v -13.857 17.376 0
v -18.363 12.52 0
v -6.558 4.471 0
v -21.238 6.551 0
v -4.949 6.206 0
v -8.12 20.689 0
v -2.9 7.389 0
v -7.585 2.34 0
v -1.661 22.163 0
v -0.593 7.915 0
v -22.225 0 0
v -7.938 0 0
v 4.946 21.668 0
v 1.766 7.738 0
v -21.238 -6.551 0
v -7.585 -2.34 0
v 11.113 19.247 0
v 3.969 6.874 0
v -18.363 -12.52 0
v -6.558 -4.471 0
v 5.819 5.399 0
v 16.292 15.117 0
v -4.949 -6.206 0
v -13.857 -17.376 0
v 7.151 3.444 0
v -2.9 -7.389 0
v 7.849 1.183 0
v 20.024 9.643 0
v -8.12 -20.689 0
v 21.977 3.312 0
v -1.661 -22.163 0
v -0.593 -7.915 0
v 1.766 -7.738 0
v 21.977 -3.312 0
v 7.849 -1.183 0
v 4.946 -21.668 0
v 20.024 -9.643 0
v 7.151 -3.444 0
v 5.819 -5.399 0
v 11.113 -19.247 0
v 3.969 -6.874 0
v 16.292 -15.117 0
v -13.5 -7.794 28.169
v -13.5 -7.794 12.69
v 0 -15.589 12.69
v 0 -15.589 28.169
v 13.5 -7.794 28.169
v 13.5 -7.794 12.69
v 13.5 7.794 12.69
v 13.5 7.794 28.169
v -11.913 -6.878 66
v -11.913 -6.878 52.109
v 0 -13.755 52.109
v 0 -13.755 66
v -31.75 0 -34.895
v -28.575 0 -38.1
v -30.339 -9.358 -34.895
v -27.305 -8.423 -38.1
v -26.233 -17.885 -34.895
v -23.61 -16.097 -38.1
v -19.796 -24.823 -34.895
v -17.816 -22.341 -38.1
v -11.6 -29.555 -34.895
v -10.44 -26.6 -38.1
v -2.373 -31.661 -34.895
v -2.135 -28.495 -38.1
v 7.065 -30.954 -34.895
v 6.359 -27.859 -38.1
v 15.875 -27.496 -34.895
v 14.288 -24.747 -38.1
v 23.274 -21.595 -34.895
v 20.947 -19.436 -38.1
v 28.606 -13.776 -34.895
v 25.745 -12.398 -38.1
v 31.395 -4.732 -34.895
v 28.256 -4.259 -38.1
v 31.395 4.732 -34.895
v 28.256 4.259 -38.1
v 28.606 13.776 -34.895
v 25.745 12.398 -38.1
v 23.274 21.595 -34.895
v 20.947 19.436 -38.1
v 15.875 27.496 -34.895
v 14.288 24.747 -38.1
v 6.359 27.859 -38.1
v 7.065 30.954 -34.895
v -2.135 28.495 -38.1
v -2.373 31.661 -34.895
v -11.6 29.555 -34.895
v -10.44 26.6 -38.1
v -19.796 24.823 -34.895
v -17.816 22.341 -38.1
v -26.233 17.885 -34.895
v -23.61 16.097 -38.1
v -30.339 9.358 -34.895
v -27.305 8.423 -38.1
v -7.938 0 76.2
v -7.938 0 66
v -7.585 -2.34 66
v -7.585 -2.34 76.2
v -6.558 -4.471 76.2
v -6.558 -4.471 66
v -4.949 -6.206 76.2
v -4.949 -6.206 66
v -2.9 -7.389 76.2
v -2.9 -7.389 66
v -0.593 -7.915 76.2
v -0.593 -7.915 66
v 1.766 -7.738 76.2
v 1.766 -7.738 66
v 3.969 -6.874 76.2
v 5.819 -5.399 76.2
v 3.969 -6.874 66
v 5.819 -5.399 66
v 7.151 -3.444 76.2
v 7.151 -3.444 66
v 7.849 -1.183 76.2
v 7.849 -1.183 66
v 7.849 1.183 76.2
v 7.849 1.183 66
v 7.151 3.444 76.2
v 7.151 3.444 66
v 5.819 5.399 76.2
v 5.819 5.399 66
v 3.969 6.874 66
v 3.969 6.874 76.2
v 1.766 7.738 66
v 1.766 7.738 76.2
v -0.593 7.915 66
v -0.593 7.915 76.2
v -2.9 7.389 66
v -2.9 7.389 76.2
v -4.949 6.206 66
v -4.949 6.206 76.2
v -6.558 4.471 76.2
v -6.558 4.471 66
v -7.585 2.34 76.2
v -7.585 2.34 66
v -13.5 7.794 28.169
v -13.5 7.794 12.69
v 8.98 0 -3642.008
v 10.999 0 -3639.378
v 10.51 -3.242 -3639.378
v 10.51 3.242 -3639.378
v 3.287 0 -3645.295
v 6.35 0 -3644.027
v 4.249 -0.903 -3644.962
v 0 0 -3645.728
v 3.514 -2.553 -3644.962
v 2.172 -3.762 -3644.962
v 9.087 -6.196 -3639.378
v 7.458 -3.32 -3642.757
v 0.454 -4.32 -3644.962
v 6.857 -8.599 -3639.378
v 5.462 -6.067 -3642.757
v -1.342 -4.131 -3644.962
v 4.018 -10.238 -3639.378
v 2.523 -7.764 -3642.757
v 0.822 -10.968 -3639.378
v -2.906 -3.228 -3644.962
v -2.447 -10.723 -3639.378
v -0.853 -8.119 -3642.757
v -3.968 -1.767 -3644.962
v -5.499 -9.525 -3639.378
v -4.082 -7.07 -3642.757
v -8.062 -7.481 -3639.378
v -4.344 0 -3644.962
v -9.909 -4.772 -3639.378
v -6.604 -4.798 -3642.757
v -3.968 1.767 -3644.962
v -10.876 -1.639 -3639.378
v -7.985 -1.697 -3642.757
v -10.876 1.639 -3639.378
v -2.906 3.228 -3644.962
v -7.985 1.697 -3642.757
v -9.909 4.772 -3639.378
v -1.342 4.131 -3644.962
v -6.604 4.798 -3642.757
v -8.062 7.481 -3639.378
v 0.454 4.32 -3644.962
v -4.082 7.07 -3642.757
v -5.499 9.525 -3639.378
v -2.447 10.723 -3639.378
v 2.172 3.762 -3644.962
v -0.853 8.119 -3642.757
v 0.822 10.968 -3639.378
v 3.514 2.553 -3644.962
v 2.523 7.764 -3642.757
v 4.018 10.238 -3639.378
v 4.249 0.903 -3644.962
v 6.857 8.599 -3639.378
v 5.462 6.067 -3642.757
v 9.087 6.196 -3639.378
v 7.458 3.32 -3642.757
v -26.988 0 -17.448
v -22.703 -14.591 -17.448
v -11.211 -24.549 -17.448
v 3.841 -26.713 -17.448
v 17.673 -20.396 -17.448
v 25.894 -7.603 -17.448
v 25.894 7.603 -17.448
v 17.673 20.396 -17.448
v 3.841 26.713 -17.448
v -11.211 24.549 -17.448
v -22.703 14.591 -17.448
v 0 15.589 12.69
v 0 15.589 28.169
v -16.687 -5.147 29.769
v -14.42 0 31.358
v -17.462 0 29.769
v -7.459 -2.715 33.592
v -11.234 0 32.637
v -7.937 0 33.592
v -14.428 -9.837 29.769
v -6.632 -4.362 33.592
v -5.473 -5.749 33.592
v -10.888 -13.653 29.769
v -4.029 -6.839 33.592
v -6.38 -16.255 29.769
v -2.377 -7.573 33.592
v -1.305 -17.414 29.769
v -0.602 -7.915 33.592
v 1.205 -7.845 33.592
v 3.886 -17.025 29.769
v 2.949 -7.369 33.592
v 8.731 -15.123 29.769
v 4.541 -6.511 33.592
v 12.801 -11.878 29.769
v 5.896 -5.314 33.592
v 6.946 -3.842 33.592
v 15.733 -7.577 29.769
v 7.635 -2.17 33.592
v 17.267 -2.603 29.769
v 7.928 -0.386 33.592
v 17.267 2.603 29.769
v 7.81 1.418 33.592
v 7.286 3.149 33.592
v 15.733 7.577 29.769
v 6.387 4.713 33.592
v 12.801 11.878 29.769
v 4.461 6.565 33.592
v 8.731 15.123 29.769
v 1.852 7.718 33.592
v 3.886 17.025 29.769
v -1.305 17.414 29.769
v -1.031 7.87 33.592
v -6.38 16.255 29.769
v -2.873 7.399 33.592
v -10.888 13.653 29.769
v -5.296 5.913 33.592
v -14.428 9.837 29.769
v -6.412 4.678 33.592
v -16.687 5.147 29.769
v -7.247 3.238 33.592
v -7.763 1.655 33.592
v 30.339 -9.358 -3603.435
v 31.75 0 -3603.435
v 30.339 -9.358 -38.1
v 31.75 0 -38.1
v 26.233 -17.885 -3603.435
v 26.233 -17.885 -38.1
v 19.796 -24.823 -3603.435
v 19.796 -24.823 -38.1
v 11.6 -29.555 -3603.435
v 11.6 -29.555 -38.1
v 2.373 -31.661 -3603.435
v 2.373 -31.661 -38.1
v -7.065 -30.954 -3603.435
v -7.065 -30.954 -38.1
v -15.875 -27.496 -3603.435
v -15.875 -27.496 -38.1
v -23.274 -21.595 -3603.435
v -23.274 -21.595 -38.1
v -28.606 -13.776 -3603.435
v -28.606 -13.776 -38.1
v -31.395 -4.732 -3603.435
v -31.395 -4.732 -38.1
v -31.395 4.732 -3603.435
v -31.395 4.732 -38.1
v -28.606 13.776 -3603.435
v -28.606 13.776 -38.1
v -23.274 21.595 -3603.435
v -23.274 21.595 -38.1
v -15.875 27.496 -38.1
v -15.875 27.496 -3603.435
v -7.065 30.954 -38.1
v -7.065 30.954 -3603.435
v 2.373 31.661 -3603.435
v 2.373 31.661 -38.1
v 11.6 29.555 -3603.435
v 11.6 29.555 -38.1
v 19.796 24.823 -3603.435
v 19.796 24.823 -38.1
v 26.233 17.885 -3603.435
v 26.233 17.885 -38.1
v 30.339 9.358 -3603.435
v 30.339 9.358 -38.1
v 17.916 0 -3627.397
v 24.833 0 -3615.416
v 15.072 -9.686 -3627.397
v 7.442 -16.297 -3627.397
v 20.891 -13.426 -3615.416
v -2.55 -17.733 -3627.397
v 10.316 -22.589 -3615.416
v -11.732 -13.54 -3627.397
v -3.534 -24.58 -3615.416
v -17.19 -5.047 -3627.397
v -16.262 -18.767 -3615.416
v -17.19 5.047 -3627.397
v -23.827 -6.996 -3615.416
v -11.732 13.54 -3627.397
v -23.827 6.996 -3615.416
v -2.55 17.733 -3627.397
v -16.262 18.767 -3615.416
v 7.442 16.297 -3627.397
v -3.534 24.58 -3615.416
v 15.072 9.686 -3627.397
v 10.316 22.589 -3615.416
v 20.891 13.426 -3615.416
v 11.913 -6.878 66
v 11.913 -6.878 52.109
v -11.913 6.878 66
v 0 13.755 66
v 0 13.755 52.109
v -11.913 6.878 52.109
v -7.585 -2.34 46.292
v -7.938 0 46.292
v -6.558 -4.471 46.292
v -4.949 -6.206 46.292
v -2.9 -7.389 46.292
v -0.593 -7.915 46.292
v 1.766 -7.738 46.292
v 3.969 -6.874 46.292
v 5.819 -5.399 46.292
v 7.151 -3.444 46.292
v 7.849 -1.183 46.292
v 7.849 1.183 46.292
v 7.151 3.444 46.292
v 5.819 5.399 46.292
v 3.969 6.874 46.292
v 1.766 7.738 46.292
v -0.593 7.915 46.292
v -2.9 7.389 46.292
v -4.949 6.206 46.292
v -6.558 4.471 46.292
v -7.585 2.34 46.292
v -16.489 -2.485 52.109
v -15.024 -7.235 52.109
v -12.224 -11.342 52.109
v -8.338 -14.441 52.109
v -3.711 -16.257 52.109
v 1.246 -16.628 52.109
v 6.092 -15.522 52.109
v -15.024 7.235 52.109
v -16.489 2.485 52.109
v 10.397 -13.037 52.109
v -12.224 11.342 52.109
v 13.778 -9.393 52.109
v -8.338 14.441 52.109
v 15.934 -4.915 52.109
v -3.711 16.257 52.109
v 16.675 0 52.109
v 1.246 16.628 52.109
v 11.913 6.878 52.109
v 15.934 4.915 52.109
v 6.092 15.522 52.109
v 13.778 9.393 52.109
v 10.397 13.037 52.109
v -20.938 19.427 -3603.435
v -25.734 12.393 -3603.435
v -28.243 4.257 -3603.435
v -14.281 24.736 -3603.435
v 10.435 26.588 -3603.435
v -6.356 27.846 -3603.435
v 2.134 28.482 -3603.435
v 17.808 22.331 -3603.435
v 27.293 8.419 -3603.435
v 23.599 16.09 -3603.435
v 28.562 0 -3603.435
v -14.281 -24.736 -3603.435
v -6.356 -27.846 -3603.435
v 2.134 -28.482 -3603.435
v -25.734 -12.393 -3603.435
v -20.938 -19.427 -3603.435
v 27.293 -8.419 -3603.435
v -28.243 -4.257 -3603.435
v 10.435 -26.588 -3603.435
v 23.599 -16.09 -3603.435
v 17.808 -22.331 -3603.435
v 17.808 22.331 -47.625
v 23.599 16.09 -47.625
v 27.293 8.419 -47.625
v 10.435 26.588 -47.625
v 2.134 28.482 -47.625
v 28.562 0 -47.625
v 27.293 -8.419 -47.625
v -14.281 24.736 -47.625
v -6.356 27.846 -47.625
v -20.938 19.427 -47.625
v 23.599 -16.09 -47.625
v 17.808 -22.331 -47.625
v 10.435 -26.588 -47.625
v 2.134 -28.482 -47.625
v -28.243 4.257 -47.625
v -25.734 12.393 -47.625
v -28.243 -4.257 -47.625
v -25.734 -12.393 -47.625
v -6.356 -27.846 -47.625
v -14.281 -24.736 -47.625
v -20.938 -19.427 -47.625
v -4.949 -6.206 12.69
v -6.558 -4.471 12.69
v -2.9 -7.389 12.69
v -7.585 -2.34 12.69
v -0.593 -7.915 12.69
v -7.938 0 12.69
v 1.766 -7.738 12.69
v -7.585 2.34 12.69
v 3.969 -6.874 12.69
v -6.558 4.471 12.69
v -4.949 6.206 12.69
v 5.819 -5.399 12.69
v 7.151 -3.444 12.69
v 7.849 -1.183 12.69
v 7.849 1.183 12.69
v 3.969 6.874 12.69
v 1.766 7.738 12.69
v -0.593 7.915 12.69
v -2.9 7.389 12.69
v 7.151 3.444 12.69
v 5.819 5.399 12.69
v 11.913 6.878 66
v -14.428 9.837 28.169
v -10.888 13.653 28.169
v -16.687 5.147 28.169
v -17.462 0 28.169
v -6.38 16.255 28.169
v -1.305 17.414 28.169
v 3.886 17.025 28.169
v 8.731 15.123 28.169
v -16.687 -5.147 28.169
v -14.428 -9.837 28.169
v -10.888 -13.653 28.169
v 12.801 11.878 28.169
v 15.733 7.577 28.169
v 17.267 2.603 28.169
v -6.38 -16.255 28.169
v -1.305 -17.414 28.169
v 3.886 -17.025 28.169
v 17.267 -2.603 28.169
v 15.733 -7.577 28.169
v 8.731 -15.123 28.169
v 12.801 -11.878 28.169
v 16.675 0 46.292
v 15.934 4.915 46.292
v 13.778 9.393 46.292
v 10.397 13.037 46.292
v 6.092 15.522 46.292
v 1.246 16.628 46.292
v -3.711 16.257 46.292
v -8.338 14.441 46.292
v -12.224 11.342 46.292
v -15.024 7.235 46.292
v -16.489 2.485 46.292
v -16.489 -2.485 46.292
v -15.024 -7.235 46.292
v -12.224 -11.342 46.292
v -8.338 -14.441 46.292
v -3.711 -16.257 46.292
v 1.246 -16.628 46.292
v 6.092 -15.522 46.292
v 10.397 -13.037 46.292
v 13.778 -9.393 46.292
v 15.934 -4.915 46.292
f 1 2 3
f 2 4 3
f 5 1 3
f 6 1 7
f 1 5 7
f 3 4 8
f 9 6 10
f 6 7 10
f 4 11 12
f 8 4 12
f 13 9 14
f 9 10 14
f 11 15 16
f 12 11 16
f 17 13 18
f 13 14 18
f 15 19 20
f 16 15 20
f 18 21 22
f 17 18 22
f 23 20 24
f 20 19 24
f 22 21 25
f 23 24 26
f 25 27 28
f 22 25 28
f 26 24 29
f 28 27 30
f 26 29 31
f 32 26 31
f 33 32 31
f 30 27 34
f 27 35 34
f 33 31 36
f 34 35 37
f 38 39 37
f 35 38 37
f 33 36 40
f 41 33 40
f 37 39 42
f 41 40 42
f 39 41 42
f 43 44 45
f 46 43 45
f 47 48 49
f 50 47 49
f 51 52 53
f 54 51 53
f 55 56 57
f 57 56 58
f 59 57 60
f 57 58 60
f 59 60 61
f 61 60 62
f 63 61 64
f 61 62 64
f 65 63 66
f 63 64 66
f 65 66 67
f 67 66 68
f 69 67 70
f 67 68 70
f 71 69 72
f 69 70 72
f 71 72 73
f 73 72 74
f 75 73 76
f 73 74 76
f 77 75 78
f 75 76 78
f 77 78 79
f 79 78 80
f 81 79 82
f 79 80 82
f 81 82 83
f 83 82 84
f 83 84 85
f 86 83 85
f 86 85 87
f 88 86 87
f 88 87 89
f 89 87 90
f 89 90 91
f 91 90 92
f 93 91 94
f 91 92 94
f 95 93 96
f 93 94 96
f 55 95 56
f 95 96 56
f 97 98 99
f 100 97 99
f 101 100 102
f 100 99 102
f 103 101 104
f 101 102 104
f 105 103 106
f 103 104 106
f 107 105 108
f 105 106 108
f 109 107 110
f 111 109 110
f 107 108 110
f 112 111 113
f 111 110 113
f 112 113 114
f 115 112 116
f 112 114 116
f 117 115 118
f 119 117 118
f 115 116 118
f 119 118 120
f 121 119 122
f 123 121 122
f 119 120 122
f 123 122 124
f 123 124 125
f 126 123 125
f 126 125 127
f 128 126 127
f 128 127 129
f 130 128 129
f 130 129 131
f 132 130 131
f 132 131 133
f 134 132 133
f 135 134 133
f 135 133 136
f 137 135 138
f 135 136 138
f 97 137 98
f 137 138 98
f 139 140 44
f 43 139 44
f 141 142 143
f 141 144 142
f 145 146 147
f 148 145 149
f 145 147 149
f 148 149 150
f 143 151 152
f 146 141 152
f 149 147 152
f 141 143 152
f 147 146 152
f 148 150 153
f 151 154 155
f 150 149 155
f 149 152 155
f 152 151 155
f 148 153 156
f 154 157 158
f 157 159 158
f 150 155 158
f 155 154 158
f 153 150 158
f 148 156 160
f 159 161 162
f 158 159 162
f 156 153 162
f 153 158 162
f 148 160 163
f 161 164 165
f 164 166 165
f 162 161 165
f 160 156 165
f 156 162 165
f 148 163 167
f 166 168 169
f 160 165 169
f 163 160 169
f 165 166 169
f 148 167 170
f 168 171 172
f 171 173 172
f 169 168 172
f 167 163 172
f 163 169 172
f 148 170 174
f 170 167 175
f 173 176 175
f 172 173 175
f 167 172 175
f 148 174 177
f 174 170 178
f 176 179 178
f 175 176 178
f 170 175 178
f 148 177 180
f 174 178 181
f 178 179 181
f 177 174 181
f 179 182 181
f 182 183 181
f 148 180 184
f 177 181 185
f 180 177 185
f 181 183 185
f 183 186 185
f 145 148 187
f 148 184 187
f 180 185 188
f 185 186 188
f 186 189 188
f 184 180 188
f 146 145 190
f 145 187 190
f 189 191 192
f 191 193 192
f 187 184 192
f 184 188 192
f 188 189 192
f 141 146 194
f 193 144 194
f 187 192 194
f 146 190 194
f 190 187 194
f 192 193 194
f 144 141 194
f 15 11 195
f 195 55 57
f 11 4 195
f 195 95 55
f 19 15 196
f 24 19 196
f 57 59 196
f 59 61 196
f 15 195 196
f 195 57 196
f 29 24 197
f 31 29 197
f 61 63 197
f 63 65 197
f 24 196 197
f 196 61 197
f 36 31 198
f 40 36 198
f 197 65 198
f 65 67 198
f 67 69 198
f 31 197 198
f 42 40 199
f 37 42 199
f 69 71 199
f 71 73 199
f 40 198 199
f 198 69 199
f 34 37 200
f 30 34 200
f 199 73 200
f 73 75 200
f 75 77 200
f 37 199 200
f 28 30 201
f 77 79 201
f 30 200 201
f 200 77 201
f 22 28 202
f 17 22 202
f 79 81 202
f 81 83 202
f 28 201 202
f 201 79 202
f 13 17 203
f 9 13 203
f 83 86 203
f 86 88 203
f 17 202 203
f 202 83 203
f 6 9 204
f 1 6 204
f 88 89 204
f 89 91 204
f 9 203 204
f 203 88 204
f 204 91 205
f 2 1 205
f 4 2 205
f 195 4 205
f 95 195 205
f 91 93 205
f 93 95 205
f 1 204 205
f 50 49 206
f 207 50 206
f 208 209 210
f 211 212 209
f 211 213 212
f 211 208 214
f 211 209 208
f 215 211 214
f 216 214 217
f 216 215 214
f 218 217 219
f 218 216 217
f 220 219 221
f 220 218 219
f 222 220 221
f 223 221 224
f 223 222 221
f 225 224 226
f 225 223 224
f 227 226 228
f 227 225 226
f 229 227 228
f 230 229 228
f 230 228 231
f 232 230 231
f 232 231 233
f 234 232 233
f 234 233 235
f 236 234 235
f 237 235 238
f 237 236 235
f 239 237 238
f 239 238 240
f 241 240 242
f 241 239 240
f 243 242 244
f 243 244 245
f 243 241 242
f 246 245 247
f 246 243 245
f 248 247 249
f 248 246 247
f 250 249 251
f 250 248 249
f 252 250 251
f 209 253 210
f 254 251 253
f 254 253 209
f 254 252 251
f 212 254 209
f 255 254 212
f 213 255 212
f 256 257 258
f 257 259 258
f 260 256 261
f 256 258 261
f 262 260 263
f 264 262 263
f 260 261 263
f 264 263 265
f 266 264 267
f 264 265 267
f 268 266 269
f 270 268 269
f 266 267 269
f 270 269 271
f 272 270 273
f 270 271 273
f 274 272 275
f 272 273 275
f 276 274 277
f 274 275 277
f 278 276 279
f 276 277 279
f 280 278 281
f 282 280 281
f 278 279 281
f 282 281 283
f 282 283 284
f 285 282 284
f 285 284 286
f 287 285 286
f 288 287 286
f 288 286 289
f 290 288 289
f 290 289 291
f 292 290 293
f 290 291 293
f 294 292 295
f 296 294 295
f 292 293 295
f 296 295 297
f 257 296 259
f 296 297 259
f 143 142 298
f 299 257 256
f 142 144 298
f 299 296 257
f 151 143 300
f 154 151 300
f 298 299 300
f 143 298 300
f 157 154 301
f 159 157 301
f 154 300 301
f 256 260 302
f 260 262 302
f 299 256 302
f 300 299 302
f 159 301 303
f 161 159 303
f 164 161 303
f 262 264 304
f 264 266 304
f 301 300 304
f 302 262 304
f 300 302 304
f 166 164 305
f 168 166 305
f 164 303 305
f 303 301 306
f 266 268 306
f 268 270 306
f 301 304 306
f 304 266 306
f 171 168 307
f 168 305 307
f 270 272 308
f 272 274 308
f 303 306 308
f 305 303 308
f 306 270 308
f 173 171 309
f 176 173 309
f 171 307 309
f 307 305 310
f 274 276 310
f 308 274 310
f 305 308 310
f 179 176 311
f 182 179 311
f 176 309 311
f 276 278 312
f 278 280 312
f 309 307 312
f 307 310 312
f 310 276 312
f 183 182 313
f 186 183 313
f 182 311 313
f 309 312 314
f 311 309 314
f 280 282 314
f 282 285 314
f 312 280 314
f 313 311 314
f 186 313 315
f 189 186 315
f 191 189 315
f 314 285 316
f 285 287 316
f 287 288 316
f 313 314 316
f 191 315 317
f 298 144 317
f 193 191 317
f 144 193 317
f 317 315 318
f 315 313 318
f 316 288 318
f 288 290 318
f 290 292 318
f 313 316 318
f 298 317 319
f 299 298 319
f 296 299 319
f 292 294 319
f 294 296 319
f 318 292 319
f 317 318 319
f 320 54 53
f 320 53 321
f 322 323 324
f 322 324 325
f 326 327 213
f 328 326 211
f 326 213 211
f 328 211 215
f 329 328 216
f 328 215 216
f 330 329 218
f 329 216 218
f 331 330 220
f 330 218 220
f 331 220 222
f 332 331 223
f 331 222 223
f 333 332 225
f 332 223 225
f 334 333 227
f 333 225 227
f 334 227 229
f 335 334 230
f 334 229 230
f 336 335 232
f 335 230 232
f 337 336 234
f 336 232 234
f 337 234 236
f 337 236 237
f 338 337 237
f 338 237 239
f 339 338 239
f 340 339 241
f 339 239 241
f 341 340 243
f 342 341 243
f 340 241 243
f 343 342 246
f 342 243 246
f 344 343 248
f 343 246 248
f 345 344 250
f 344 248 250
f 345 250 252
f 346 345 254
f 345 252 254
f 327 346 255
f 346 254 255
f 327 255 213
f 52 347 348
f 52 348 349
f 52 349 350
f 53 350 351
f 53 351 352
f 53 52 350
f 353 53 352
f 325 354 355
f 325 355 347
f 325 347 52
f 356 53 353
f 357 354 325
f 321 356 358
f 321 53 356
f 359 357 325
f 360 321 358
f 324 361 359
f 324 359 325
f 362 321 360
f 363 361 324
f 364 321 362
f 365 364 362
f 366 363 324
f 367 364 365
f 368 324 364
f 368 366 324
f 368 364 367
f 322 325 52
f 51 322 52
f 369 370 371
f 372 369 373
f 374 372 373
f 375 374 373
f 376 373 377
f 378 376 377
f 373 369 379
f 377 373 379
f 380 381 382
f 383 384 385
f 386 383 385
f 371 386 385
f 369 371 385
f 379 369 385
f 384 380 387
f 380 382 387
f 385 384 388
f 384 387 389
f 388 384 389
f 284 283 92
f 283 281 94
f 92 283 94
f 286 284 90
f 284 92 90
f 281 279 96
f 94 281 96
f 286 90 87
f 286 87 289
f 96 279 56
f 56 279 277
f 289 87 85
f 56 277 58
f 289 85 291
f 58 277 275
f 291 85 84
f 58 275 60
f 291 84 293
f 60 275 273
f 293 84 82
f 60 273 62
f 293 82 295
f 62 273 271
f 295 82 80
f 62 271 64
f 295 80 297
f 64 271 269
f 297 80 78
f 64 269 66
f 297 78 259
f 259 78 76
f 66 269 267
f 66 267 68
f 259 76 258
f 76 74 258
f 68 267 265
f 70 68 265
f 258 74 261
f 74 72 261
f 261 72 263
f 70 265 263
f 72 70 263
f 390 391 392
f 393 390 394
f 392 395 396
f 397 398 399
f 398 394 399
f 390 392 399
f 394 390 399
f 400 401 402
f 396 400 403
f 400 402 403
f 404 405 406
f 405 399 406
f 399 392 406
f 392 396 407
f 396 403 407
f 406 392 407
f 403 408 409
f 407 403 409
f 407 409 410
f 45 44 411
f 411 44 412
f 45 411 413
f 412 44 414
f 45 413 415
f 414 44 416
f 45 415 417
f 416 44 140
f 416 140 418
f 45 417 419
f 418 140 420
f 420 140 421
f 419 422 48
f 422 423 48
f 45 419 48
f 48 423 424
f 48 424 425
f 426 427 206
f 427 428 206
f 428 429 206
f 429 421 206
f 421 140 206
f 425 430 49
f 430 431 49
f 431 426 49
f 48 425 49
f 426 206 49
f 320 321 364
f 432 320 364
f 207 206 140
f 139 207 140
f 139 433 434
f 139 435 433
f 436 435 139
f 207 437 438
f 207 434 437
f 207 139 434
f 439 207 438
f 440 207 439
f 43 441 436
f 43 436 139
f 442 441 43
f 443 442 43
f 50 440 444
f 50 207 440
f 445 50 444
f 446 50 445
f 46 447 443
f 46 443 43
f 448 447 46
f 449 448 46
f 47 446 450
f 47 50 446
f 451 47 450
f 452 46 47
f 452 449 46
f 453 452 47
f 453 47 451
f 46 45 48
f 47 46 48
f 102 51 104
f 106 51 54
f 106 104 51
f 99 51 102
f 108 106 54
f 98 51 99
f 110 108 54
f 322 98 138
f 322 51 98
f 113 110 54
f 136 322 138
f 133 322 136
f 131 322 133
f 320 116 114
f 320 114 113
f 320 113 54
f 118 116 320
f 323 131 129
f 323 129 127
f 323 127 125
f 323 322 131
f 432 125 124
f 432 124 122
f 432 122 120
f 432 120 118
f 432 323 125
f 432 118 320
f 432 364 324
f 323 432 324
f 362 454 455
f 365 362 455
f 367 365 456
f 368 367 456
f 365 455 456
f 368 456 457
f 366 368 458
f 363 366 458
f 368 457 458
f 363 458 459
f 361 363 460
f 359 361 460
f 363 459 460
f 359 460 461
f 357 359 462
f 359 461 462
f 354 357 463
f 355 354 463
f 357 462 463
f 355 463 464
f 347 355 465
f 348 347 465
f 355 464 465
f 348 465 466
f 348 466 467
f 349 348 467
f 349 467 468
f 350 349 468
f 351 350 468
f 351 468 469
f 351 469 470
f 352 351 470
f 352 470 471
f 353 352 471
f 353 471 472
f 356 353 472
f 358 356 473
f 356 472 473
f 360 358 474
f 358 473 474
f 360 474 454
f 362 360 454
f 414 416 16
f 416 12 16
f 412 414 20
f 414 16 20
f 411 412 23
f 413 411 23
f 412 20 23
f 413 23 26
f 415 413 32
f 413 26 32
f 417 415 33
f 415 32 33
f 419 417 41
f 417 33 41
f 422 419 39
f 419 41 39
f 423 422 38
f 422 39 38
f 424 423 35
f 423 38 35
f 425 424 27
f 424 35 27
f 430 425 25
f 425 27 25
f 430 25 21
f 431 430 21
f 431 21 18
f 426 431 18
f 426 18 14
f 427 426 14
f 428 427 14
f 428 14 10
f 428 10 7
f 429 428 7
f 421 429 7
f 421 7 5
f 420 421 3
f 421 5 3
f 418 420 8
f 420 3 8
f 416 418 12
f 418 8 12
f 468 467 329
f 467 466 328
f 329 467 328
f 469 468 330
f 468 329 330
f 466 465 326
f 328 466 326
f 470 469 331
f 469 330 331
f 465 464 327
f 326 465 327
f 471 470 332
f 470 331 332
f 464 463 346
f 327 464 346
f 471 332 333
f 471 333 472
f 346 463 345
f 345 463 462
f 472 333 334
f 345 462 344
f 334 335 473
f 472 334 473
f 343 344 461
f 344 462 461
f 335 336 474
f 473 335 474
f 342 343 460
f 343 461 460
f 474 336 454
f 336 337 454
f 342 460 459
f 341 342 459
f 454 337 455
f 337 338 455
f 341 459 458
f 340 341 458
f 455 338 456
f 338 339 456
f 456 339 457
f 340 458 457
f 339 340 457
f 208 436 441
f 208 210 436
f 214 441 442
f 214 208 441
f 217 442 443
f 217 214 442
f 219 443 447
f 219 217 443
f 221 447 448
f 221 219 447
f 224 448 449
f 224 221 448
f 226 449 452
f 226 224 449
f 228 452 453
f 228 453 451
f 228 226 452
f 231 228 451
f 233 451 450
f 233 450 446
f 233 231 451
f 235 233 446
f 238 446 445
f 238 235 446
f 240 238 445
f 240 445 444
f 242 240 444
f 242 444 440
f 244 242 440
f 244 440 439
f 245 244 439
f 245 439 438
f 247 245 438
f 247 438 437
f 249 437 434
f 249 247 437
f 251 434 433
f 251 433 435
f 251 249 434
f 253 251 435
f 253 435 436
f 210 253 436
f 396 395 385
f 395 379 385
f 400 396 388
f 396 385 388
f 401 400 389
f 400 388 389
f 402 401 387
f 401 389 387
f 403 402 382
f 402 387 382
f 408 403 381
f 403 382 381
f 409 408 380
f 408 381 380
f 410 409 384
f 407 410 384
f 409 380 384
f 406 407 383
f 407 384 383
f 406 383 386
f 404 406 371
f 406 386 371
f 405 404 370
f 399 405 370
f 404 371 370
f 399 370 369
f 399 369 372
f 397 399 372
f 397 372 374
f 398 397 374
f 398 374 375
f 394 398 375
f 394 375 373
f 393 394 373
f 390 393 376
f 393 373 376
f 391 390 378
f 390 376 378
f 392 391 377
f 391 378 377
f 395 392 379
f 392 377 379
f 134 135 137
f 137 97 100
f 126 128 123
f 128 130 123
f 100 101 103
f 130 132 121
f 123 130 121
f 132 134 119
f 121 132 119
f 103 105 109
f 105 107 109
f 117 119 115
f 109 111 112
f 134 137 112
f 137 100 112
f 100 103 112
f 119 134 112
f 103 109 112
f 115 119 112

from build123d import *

# Parameters (mm, degrees)
BOSS_REVOLVE3_START         = 12.690475
BOSS_REVOLVE3_OUTLINE_R     = 7.9375
BOSS_REVOLVE3_DEPTH         = 15.478125
BOSS_REVOLVE3_START_2       = 46.292398399
BOSS_REVOLVE3_2_OUTLINE_R   = 16.6751
BOSS_REVOLVE3_2_OUTLINE_R_2 = 7.9375
BOSS_REVOLVE3_2_DEPTH       = 5.8166
BOSS_EXTRUDE2_DEPTH         = 13.890625


# Read off the part's stored shape, not the designer's step: Boss-Revolve3
with BuildPart() as part:
    # Sketch1 → Base-Revolve (revolve)
    with BuildSketch(Plane(origin=(0, 0, 0), x_dir=(0, 0, -1), z_dir=(1, 0, 0)), mode=Mode.PRIVATE) as base_revolve_sk:
        Polygon((-76.2, 0), (-76.2, 7.9375), (0, 7.9375), (0, 22.225), (34.895210283, 31.75), (38.1, 28.575), (47.625, 28.575), (47.625, 0), align=None)
    revolve(base_revolve_sk.sketch.rotate(Axis((0, 0, 0), (0, 0, 1)), 90), axis=Axis((0, 0, 0), (0, 0, 1)))

    # Sketch3 → Boss-Revolve2 (revolve)
    with BuildSketch(Plane(origin=(0, 0, 0), x_dir=(0, 0, -1), z_dir=(1, 0, 0)), mode=Mode.PRIVATE) as boss_revolve2_sk:
        with BuildLine():
            Line((-28.1686, 0), (-28.1686, 17.4625))
            Line((-28.1686, 17.4625), (-29.7688, 17.4625))
            ThreePointArc((-29.7688, 17.4625), (-33.309963658, 9.048473715), (-34.5186, 0))
            Line((-34.5186, 0), (-28.1686, 0))
        make_face()
    revolve(boss_revolve2_sk.sketch.rotate(Axis((0, 0, 0), (0, 0, 1)), 90), axis=Axis((0, 0, 0), (0, 0, 1)))

    # Sketch2 → Boss-Revolve1 (revolve)
    with BuildSketch(Plane(origin=(0, 0, 0), x_dir=(0, 0, -1), z_dir=(1, 0, 0)), mode=Mode.PRIVATE) as boss_revolve1_sk:
        with BuildLine():
            Line((38.1, 31.75), (38.1, 28.5623))
            Line((38.1, 28.5623), (3603.43540845, 28.5623))
            Line((3603.43540845, 28.5623), (3603.43540845, 0))
            Line((3603.43540845, 0), (3645.72802159, 0))
            ThreePointArc((3645.72802159, 0), (3644.026544218, 6.35), (3639.37802159, 10.998522628))
            Line((3639.37802159, 10.998522628), (3603.43540845, 31.75))
            Line((3603.43540845, 31.75), (38.1, 31.75))
        make_face()
    revolve(boss_revolve1_sk.sketch.rotate(Axis((0, 0, 29.7434), (0, 0, -1)), 90), axis=Axis((0, 0, 29.7434), (0, 0, -1)))

    # Boss-Revolve3 outline → Boss-Revolve3 (add)
    with BuildSketch(Plane.XY.offset(BOSS_REVOLVE3_START)):
        Polygon((0, -15.588572738), (13.5001, -7.794286369), (13.5001, 7.794286369), (0, 15.588572738), (-13.5001, 7.794286369), (-13.5001, -7.794286369), align=None)
        Circle(BOSS_REVOLVE3_OUTLINE_R, mode=Mode.SUBTRACT)
    extrude(amount=BOSS_REVOLVE3_DEPTH)

    # Boss-Revolve3 2 outline → Boss-Revolve3 2 (add)
    with BuildSketch(Plane.XY.offset(BOSS_REVOLVE3_START_2)):
        Circle(BOSS_REVOLVE3_2_OUTLINE_R)
        Circle(BOSS_REVOLVE3_2_OUTLINE_R_2, mode=Mode.SUBTRACT)
    extrude(amount=BOSS_REVOLVE3_2_DEPTH)

    # Sketch6 → Boss-Extrude2 (add)
    with BuildSketch(Plane.XY.offset(52.108998399)):
        Polygon((0, -13.755485633), (11.9126, -6.877742817), (11.9126, 6.877742817), (0, 13.755485633), (-11.9126, 6.877742817), (-11.9126, -6.877742817), align=None)
    extrude(amount=BOSS_EXTRUDE2_DEPTH)


solid = part.part
